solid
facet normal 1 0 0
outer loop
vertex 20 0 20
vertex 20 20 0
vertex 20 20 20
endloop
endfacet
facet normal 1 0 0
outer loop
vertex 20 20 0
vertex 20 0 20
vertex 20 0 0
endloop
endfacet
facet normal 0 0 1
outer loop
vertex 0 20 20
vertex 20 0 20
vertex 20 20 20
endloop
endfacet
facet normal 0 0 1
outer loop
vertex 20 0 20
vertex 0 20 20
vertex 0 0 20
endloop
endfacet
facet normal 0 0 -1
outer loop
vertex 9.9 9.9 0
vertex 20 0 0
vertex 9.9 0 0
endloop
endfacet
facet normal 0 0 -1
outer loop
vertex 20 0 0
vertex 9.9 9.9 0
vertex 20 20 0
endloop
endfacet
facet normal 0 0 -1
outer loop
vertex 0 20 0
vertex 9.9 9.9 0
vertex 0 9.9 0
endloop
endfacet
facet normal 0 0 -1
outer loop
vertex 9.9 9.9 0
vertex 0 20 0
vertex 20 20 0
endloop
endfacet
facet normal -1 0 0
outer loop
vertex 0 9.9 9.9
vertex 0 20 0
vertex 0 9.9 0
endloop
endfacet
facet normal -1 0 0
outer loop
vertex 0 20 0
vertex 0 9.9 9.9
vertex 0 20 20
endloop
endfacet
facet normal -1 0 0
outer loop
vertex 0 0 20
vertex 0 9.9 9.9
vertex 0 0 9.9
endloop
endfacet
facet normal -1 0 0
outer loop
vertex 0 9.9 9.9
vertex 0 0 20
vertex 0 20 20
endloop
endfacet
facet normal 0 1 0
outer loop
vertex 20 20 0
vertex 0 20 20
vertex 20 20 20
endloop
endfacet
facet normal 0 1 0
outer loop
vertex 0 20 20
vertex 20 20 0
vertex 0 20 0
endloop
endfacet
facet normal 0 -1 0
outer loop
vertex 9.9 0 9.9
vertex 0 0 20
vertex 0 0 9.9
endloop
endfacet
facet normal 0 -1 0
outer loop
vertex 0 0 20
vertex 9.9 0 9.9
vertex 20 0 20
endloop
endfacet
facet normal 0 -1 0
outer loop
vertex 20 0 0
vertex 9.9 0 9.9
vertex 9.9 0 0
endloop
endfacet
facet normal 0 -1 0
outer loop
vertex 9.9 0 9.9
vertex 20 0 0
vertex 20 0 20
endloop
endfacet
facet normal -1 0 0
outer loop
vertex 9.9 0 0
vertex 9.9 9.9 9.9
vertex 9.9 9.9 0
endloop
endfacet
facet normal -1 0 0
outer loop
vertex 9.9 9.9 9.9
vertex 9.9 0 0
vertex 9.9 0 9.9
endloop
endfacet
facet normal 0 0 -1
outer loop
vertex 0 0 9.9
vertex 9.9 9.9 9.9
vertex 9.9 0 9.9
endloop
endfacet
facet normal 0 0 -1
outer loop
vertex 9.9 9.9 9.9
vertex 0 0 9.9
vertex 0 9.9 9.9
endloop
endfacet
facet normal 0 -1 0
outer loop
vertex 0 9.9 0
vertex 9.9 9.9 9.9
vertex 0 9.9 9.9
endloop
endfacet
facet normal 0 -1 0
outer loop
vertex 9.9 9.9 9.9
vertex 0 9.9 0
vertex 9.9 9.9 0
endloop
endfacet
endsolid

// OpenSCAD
difference(){
  cube(20);
  translate([-0.1,-0.1,-0.1]) cube(10);
}
